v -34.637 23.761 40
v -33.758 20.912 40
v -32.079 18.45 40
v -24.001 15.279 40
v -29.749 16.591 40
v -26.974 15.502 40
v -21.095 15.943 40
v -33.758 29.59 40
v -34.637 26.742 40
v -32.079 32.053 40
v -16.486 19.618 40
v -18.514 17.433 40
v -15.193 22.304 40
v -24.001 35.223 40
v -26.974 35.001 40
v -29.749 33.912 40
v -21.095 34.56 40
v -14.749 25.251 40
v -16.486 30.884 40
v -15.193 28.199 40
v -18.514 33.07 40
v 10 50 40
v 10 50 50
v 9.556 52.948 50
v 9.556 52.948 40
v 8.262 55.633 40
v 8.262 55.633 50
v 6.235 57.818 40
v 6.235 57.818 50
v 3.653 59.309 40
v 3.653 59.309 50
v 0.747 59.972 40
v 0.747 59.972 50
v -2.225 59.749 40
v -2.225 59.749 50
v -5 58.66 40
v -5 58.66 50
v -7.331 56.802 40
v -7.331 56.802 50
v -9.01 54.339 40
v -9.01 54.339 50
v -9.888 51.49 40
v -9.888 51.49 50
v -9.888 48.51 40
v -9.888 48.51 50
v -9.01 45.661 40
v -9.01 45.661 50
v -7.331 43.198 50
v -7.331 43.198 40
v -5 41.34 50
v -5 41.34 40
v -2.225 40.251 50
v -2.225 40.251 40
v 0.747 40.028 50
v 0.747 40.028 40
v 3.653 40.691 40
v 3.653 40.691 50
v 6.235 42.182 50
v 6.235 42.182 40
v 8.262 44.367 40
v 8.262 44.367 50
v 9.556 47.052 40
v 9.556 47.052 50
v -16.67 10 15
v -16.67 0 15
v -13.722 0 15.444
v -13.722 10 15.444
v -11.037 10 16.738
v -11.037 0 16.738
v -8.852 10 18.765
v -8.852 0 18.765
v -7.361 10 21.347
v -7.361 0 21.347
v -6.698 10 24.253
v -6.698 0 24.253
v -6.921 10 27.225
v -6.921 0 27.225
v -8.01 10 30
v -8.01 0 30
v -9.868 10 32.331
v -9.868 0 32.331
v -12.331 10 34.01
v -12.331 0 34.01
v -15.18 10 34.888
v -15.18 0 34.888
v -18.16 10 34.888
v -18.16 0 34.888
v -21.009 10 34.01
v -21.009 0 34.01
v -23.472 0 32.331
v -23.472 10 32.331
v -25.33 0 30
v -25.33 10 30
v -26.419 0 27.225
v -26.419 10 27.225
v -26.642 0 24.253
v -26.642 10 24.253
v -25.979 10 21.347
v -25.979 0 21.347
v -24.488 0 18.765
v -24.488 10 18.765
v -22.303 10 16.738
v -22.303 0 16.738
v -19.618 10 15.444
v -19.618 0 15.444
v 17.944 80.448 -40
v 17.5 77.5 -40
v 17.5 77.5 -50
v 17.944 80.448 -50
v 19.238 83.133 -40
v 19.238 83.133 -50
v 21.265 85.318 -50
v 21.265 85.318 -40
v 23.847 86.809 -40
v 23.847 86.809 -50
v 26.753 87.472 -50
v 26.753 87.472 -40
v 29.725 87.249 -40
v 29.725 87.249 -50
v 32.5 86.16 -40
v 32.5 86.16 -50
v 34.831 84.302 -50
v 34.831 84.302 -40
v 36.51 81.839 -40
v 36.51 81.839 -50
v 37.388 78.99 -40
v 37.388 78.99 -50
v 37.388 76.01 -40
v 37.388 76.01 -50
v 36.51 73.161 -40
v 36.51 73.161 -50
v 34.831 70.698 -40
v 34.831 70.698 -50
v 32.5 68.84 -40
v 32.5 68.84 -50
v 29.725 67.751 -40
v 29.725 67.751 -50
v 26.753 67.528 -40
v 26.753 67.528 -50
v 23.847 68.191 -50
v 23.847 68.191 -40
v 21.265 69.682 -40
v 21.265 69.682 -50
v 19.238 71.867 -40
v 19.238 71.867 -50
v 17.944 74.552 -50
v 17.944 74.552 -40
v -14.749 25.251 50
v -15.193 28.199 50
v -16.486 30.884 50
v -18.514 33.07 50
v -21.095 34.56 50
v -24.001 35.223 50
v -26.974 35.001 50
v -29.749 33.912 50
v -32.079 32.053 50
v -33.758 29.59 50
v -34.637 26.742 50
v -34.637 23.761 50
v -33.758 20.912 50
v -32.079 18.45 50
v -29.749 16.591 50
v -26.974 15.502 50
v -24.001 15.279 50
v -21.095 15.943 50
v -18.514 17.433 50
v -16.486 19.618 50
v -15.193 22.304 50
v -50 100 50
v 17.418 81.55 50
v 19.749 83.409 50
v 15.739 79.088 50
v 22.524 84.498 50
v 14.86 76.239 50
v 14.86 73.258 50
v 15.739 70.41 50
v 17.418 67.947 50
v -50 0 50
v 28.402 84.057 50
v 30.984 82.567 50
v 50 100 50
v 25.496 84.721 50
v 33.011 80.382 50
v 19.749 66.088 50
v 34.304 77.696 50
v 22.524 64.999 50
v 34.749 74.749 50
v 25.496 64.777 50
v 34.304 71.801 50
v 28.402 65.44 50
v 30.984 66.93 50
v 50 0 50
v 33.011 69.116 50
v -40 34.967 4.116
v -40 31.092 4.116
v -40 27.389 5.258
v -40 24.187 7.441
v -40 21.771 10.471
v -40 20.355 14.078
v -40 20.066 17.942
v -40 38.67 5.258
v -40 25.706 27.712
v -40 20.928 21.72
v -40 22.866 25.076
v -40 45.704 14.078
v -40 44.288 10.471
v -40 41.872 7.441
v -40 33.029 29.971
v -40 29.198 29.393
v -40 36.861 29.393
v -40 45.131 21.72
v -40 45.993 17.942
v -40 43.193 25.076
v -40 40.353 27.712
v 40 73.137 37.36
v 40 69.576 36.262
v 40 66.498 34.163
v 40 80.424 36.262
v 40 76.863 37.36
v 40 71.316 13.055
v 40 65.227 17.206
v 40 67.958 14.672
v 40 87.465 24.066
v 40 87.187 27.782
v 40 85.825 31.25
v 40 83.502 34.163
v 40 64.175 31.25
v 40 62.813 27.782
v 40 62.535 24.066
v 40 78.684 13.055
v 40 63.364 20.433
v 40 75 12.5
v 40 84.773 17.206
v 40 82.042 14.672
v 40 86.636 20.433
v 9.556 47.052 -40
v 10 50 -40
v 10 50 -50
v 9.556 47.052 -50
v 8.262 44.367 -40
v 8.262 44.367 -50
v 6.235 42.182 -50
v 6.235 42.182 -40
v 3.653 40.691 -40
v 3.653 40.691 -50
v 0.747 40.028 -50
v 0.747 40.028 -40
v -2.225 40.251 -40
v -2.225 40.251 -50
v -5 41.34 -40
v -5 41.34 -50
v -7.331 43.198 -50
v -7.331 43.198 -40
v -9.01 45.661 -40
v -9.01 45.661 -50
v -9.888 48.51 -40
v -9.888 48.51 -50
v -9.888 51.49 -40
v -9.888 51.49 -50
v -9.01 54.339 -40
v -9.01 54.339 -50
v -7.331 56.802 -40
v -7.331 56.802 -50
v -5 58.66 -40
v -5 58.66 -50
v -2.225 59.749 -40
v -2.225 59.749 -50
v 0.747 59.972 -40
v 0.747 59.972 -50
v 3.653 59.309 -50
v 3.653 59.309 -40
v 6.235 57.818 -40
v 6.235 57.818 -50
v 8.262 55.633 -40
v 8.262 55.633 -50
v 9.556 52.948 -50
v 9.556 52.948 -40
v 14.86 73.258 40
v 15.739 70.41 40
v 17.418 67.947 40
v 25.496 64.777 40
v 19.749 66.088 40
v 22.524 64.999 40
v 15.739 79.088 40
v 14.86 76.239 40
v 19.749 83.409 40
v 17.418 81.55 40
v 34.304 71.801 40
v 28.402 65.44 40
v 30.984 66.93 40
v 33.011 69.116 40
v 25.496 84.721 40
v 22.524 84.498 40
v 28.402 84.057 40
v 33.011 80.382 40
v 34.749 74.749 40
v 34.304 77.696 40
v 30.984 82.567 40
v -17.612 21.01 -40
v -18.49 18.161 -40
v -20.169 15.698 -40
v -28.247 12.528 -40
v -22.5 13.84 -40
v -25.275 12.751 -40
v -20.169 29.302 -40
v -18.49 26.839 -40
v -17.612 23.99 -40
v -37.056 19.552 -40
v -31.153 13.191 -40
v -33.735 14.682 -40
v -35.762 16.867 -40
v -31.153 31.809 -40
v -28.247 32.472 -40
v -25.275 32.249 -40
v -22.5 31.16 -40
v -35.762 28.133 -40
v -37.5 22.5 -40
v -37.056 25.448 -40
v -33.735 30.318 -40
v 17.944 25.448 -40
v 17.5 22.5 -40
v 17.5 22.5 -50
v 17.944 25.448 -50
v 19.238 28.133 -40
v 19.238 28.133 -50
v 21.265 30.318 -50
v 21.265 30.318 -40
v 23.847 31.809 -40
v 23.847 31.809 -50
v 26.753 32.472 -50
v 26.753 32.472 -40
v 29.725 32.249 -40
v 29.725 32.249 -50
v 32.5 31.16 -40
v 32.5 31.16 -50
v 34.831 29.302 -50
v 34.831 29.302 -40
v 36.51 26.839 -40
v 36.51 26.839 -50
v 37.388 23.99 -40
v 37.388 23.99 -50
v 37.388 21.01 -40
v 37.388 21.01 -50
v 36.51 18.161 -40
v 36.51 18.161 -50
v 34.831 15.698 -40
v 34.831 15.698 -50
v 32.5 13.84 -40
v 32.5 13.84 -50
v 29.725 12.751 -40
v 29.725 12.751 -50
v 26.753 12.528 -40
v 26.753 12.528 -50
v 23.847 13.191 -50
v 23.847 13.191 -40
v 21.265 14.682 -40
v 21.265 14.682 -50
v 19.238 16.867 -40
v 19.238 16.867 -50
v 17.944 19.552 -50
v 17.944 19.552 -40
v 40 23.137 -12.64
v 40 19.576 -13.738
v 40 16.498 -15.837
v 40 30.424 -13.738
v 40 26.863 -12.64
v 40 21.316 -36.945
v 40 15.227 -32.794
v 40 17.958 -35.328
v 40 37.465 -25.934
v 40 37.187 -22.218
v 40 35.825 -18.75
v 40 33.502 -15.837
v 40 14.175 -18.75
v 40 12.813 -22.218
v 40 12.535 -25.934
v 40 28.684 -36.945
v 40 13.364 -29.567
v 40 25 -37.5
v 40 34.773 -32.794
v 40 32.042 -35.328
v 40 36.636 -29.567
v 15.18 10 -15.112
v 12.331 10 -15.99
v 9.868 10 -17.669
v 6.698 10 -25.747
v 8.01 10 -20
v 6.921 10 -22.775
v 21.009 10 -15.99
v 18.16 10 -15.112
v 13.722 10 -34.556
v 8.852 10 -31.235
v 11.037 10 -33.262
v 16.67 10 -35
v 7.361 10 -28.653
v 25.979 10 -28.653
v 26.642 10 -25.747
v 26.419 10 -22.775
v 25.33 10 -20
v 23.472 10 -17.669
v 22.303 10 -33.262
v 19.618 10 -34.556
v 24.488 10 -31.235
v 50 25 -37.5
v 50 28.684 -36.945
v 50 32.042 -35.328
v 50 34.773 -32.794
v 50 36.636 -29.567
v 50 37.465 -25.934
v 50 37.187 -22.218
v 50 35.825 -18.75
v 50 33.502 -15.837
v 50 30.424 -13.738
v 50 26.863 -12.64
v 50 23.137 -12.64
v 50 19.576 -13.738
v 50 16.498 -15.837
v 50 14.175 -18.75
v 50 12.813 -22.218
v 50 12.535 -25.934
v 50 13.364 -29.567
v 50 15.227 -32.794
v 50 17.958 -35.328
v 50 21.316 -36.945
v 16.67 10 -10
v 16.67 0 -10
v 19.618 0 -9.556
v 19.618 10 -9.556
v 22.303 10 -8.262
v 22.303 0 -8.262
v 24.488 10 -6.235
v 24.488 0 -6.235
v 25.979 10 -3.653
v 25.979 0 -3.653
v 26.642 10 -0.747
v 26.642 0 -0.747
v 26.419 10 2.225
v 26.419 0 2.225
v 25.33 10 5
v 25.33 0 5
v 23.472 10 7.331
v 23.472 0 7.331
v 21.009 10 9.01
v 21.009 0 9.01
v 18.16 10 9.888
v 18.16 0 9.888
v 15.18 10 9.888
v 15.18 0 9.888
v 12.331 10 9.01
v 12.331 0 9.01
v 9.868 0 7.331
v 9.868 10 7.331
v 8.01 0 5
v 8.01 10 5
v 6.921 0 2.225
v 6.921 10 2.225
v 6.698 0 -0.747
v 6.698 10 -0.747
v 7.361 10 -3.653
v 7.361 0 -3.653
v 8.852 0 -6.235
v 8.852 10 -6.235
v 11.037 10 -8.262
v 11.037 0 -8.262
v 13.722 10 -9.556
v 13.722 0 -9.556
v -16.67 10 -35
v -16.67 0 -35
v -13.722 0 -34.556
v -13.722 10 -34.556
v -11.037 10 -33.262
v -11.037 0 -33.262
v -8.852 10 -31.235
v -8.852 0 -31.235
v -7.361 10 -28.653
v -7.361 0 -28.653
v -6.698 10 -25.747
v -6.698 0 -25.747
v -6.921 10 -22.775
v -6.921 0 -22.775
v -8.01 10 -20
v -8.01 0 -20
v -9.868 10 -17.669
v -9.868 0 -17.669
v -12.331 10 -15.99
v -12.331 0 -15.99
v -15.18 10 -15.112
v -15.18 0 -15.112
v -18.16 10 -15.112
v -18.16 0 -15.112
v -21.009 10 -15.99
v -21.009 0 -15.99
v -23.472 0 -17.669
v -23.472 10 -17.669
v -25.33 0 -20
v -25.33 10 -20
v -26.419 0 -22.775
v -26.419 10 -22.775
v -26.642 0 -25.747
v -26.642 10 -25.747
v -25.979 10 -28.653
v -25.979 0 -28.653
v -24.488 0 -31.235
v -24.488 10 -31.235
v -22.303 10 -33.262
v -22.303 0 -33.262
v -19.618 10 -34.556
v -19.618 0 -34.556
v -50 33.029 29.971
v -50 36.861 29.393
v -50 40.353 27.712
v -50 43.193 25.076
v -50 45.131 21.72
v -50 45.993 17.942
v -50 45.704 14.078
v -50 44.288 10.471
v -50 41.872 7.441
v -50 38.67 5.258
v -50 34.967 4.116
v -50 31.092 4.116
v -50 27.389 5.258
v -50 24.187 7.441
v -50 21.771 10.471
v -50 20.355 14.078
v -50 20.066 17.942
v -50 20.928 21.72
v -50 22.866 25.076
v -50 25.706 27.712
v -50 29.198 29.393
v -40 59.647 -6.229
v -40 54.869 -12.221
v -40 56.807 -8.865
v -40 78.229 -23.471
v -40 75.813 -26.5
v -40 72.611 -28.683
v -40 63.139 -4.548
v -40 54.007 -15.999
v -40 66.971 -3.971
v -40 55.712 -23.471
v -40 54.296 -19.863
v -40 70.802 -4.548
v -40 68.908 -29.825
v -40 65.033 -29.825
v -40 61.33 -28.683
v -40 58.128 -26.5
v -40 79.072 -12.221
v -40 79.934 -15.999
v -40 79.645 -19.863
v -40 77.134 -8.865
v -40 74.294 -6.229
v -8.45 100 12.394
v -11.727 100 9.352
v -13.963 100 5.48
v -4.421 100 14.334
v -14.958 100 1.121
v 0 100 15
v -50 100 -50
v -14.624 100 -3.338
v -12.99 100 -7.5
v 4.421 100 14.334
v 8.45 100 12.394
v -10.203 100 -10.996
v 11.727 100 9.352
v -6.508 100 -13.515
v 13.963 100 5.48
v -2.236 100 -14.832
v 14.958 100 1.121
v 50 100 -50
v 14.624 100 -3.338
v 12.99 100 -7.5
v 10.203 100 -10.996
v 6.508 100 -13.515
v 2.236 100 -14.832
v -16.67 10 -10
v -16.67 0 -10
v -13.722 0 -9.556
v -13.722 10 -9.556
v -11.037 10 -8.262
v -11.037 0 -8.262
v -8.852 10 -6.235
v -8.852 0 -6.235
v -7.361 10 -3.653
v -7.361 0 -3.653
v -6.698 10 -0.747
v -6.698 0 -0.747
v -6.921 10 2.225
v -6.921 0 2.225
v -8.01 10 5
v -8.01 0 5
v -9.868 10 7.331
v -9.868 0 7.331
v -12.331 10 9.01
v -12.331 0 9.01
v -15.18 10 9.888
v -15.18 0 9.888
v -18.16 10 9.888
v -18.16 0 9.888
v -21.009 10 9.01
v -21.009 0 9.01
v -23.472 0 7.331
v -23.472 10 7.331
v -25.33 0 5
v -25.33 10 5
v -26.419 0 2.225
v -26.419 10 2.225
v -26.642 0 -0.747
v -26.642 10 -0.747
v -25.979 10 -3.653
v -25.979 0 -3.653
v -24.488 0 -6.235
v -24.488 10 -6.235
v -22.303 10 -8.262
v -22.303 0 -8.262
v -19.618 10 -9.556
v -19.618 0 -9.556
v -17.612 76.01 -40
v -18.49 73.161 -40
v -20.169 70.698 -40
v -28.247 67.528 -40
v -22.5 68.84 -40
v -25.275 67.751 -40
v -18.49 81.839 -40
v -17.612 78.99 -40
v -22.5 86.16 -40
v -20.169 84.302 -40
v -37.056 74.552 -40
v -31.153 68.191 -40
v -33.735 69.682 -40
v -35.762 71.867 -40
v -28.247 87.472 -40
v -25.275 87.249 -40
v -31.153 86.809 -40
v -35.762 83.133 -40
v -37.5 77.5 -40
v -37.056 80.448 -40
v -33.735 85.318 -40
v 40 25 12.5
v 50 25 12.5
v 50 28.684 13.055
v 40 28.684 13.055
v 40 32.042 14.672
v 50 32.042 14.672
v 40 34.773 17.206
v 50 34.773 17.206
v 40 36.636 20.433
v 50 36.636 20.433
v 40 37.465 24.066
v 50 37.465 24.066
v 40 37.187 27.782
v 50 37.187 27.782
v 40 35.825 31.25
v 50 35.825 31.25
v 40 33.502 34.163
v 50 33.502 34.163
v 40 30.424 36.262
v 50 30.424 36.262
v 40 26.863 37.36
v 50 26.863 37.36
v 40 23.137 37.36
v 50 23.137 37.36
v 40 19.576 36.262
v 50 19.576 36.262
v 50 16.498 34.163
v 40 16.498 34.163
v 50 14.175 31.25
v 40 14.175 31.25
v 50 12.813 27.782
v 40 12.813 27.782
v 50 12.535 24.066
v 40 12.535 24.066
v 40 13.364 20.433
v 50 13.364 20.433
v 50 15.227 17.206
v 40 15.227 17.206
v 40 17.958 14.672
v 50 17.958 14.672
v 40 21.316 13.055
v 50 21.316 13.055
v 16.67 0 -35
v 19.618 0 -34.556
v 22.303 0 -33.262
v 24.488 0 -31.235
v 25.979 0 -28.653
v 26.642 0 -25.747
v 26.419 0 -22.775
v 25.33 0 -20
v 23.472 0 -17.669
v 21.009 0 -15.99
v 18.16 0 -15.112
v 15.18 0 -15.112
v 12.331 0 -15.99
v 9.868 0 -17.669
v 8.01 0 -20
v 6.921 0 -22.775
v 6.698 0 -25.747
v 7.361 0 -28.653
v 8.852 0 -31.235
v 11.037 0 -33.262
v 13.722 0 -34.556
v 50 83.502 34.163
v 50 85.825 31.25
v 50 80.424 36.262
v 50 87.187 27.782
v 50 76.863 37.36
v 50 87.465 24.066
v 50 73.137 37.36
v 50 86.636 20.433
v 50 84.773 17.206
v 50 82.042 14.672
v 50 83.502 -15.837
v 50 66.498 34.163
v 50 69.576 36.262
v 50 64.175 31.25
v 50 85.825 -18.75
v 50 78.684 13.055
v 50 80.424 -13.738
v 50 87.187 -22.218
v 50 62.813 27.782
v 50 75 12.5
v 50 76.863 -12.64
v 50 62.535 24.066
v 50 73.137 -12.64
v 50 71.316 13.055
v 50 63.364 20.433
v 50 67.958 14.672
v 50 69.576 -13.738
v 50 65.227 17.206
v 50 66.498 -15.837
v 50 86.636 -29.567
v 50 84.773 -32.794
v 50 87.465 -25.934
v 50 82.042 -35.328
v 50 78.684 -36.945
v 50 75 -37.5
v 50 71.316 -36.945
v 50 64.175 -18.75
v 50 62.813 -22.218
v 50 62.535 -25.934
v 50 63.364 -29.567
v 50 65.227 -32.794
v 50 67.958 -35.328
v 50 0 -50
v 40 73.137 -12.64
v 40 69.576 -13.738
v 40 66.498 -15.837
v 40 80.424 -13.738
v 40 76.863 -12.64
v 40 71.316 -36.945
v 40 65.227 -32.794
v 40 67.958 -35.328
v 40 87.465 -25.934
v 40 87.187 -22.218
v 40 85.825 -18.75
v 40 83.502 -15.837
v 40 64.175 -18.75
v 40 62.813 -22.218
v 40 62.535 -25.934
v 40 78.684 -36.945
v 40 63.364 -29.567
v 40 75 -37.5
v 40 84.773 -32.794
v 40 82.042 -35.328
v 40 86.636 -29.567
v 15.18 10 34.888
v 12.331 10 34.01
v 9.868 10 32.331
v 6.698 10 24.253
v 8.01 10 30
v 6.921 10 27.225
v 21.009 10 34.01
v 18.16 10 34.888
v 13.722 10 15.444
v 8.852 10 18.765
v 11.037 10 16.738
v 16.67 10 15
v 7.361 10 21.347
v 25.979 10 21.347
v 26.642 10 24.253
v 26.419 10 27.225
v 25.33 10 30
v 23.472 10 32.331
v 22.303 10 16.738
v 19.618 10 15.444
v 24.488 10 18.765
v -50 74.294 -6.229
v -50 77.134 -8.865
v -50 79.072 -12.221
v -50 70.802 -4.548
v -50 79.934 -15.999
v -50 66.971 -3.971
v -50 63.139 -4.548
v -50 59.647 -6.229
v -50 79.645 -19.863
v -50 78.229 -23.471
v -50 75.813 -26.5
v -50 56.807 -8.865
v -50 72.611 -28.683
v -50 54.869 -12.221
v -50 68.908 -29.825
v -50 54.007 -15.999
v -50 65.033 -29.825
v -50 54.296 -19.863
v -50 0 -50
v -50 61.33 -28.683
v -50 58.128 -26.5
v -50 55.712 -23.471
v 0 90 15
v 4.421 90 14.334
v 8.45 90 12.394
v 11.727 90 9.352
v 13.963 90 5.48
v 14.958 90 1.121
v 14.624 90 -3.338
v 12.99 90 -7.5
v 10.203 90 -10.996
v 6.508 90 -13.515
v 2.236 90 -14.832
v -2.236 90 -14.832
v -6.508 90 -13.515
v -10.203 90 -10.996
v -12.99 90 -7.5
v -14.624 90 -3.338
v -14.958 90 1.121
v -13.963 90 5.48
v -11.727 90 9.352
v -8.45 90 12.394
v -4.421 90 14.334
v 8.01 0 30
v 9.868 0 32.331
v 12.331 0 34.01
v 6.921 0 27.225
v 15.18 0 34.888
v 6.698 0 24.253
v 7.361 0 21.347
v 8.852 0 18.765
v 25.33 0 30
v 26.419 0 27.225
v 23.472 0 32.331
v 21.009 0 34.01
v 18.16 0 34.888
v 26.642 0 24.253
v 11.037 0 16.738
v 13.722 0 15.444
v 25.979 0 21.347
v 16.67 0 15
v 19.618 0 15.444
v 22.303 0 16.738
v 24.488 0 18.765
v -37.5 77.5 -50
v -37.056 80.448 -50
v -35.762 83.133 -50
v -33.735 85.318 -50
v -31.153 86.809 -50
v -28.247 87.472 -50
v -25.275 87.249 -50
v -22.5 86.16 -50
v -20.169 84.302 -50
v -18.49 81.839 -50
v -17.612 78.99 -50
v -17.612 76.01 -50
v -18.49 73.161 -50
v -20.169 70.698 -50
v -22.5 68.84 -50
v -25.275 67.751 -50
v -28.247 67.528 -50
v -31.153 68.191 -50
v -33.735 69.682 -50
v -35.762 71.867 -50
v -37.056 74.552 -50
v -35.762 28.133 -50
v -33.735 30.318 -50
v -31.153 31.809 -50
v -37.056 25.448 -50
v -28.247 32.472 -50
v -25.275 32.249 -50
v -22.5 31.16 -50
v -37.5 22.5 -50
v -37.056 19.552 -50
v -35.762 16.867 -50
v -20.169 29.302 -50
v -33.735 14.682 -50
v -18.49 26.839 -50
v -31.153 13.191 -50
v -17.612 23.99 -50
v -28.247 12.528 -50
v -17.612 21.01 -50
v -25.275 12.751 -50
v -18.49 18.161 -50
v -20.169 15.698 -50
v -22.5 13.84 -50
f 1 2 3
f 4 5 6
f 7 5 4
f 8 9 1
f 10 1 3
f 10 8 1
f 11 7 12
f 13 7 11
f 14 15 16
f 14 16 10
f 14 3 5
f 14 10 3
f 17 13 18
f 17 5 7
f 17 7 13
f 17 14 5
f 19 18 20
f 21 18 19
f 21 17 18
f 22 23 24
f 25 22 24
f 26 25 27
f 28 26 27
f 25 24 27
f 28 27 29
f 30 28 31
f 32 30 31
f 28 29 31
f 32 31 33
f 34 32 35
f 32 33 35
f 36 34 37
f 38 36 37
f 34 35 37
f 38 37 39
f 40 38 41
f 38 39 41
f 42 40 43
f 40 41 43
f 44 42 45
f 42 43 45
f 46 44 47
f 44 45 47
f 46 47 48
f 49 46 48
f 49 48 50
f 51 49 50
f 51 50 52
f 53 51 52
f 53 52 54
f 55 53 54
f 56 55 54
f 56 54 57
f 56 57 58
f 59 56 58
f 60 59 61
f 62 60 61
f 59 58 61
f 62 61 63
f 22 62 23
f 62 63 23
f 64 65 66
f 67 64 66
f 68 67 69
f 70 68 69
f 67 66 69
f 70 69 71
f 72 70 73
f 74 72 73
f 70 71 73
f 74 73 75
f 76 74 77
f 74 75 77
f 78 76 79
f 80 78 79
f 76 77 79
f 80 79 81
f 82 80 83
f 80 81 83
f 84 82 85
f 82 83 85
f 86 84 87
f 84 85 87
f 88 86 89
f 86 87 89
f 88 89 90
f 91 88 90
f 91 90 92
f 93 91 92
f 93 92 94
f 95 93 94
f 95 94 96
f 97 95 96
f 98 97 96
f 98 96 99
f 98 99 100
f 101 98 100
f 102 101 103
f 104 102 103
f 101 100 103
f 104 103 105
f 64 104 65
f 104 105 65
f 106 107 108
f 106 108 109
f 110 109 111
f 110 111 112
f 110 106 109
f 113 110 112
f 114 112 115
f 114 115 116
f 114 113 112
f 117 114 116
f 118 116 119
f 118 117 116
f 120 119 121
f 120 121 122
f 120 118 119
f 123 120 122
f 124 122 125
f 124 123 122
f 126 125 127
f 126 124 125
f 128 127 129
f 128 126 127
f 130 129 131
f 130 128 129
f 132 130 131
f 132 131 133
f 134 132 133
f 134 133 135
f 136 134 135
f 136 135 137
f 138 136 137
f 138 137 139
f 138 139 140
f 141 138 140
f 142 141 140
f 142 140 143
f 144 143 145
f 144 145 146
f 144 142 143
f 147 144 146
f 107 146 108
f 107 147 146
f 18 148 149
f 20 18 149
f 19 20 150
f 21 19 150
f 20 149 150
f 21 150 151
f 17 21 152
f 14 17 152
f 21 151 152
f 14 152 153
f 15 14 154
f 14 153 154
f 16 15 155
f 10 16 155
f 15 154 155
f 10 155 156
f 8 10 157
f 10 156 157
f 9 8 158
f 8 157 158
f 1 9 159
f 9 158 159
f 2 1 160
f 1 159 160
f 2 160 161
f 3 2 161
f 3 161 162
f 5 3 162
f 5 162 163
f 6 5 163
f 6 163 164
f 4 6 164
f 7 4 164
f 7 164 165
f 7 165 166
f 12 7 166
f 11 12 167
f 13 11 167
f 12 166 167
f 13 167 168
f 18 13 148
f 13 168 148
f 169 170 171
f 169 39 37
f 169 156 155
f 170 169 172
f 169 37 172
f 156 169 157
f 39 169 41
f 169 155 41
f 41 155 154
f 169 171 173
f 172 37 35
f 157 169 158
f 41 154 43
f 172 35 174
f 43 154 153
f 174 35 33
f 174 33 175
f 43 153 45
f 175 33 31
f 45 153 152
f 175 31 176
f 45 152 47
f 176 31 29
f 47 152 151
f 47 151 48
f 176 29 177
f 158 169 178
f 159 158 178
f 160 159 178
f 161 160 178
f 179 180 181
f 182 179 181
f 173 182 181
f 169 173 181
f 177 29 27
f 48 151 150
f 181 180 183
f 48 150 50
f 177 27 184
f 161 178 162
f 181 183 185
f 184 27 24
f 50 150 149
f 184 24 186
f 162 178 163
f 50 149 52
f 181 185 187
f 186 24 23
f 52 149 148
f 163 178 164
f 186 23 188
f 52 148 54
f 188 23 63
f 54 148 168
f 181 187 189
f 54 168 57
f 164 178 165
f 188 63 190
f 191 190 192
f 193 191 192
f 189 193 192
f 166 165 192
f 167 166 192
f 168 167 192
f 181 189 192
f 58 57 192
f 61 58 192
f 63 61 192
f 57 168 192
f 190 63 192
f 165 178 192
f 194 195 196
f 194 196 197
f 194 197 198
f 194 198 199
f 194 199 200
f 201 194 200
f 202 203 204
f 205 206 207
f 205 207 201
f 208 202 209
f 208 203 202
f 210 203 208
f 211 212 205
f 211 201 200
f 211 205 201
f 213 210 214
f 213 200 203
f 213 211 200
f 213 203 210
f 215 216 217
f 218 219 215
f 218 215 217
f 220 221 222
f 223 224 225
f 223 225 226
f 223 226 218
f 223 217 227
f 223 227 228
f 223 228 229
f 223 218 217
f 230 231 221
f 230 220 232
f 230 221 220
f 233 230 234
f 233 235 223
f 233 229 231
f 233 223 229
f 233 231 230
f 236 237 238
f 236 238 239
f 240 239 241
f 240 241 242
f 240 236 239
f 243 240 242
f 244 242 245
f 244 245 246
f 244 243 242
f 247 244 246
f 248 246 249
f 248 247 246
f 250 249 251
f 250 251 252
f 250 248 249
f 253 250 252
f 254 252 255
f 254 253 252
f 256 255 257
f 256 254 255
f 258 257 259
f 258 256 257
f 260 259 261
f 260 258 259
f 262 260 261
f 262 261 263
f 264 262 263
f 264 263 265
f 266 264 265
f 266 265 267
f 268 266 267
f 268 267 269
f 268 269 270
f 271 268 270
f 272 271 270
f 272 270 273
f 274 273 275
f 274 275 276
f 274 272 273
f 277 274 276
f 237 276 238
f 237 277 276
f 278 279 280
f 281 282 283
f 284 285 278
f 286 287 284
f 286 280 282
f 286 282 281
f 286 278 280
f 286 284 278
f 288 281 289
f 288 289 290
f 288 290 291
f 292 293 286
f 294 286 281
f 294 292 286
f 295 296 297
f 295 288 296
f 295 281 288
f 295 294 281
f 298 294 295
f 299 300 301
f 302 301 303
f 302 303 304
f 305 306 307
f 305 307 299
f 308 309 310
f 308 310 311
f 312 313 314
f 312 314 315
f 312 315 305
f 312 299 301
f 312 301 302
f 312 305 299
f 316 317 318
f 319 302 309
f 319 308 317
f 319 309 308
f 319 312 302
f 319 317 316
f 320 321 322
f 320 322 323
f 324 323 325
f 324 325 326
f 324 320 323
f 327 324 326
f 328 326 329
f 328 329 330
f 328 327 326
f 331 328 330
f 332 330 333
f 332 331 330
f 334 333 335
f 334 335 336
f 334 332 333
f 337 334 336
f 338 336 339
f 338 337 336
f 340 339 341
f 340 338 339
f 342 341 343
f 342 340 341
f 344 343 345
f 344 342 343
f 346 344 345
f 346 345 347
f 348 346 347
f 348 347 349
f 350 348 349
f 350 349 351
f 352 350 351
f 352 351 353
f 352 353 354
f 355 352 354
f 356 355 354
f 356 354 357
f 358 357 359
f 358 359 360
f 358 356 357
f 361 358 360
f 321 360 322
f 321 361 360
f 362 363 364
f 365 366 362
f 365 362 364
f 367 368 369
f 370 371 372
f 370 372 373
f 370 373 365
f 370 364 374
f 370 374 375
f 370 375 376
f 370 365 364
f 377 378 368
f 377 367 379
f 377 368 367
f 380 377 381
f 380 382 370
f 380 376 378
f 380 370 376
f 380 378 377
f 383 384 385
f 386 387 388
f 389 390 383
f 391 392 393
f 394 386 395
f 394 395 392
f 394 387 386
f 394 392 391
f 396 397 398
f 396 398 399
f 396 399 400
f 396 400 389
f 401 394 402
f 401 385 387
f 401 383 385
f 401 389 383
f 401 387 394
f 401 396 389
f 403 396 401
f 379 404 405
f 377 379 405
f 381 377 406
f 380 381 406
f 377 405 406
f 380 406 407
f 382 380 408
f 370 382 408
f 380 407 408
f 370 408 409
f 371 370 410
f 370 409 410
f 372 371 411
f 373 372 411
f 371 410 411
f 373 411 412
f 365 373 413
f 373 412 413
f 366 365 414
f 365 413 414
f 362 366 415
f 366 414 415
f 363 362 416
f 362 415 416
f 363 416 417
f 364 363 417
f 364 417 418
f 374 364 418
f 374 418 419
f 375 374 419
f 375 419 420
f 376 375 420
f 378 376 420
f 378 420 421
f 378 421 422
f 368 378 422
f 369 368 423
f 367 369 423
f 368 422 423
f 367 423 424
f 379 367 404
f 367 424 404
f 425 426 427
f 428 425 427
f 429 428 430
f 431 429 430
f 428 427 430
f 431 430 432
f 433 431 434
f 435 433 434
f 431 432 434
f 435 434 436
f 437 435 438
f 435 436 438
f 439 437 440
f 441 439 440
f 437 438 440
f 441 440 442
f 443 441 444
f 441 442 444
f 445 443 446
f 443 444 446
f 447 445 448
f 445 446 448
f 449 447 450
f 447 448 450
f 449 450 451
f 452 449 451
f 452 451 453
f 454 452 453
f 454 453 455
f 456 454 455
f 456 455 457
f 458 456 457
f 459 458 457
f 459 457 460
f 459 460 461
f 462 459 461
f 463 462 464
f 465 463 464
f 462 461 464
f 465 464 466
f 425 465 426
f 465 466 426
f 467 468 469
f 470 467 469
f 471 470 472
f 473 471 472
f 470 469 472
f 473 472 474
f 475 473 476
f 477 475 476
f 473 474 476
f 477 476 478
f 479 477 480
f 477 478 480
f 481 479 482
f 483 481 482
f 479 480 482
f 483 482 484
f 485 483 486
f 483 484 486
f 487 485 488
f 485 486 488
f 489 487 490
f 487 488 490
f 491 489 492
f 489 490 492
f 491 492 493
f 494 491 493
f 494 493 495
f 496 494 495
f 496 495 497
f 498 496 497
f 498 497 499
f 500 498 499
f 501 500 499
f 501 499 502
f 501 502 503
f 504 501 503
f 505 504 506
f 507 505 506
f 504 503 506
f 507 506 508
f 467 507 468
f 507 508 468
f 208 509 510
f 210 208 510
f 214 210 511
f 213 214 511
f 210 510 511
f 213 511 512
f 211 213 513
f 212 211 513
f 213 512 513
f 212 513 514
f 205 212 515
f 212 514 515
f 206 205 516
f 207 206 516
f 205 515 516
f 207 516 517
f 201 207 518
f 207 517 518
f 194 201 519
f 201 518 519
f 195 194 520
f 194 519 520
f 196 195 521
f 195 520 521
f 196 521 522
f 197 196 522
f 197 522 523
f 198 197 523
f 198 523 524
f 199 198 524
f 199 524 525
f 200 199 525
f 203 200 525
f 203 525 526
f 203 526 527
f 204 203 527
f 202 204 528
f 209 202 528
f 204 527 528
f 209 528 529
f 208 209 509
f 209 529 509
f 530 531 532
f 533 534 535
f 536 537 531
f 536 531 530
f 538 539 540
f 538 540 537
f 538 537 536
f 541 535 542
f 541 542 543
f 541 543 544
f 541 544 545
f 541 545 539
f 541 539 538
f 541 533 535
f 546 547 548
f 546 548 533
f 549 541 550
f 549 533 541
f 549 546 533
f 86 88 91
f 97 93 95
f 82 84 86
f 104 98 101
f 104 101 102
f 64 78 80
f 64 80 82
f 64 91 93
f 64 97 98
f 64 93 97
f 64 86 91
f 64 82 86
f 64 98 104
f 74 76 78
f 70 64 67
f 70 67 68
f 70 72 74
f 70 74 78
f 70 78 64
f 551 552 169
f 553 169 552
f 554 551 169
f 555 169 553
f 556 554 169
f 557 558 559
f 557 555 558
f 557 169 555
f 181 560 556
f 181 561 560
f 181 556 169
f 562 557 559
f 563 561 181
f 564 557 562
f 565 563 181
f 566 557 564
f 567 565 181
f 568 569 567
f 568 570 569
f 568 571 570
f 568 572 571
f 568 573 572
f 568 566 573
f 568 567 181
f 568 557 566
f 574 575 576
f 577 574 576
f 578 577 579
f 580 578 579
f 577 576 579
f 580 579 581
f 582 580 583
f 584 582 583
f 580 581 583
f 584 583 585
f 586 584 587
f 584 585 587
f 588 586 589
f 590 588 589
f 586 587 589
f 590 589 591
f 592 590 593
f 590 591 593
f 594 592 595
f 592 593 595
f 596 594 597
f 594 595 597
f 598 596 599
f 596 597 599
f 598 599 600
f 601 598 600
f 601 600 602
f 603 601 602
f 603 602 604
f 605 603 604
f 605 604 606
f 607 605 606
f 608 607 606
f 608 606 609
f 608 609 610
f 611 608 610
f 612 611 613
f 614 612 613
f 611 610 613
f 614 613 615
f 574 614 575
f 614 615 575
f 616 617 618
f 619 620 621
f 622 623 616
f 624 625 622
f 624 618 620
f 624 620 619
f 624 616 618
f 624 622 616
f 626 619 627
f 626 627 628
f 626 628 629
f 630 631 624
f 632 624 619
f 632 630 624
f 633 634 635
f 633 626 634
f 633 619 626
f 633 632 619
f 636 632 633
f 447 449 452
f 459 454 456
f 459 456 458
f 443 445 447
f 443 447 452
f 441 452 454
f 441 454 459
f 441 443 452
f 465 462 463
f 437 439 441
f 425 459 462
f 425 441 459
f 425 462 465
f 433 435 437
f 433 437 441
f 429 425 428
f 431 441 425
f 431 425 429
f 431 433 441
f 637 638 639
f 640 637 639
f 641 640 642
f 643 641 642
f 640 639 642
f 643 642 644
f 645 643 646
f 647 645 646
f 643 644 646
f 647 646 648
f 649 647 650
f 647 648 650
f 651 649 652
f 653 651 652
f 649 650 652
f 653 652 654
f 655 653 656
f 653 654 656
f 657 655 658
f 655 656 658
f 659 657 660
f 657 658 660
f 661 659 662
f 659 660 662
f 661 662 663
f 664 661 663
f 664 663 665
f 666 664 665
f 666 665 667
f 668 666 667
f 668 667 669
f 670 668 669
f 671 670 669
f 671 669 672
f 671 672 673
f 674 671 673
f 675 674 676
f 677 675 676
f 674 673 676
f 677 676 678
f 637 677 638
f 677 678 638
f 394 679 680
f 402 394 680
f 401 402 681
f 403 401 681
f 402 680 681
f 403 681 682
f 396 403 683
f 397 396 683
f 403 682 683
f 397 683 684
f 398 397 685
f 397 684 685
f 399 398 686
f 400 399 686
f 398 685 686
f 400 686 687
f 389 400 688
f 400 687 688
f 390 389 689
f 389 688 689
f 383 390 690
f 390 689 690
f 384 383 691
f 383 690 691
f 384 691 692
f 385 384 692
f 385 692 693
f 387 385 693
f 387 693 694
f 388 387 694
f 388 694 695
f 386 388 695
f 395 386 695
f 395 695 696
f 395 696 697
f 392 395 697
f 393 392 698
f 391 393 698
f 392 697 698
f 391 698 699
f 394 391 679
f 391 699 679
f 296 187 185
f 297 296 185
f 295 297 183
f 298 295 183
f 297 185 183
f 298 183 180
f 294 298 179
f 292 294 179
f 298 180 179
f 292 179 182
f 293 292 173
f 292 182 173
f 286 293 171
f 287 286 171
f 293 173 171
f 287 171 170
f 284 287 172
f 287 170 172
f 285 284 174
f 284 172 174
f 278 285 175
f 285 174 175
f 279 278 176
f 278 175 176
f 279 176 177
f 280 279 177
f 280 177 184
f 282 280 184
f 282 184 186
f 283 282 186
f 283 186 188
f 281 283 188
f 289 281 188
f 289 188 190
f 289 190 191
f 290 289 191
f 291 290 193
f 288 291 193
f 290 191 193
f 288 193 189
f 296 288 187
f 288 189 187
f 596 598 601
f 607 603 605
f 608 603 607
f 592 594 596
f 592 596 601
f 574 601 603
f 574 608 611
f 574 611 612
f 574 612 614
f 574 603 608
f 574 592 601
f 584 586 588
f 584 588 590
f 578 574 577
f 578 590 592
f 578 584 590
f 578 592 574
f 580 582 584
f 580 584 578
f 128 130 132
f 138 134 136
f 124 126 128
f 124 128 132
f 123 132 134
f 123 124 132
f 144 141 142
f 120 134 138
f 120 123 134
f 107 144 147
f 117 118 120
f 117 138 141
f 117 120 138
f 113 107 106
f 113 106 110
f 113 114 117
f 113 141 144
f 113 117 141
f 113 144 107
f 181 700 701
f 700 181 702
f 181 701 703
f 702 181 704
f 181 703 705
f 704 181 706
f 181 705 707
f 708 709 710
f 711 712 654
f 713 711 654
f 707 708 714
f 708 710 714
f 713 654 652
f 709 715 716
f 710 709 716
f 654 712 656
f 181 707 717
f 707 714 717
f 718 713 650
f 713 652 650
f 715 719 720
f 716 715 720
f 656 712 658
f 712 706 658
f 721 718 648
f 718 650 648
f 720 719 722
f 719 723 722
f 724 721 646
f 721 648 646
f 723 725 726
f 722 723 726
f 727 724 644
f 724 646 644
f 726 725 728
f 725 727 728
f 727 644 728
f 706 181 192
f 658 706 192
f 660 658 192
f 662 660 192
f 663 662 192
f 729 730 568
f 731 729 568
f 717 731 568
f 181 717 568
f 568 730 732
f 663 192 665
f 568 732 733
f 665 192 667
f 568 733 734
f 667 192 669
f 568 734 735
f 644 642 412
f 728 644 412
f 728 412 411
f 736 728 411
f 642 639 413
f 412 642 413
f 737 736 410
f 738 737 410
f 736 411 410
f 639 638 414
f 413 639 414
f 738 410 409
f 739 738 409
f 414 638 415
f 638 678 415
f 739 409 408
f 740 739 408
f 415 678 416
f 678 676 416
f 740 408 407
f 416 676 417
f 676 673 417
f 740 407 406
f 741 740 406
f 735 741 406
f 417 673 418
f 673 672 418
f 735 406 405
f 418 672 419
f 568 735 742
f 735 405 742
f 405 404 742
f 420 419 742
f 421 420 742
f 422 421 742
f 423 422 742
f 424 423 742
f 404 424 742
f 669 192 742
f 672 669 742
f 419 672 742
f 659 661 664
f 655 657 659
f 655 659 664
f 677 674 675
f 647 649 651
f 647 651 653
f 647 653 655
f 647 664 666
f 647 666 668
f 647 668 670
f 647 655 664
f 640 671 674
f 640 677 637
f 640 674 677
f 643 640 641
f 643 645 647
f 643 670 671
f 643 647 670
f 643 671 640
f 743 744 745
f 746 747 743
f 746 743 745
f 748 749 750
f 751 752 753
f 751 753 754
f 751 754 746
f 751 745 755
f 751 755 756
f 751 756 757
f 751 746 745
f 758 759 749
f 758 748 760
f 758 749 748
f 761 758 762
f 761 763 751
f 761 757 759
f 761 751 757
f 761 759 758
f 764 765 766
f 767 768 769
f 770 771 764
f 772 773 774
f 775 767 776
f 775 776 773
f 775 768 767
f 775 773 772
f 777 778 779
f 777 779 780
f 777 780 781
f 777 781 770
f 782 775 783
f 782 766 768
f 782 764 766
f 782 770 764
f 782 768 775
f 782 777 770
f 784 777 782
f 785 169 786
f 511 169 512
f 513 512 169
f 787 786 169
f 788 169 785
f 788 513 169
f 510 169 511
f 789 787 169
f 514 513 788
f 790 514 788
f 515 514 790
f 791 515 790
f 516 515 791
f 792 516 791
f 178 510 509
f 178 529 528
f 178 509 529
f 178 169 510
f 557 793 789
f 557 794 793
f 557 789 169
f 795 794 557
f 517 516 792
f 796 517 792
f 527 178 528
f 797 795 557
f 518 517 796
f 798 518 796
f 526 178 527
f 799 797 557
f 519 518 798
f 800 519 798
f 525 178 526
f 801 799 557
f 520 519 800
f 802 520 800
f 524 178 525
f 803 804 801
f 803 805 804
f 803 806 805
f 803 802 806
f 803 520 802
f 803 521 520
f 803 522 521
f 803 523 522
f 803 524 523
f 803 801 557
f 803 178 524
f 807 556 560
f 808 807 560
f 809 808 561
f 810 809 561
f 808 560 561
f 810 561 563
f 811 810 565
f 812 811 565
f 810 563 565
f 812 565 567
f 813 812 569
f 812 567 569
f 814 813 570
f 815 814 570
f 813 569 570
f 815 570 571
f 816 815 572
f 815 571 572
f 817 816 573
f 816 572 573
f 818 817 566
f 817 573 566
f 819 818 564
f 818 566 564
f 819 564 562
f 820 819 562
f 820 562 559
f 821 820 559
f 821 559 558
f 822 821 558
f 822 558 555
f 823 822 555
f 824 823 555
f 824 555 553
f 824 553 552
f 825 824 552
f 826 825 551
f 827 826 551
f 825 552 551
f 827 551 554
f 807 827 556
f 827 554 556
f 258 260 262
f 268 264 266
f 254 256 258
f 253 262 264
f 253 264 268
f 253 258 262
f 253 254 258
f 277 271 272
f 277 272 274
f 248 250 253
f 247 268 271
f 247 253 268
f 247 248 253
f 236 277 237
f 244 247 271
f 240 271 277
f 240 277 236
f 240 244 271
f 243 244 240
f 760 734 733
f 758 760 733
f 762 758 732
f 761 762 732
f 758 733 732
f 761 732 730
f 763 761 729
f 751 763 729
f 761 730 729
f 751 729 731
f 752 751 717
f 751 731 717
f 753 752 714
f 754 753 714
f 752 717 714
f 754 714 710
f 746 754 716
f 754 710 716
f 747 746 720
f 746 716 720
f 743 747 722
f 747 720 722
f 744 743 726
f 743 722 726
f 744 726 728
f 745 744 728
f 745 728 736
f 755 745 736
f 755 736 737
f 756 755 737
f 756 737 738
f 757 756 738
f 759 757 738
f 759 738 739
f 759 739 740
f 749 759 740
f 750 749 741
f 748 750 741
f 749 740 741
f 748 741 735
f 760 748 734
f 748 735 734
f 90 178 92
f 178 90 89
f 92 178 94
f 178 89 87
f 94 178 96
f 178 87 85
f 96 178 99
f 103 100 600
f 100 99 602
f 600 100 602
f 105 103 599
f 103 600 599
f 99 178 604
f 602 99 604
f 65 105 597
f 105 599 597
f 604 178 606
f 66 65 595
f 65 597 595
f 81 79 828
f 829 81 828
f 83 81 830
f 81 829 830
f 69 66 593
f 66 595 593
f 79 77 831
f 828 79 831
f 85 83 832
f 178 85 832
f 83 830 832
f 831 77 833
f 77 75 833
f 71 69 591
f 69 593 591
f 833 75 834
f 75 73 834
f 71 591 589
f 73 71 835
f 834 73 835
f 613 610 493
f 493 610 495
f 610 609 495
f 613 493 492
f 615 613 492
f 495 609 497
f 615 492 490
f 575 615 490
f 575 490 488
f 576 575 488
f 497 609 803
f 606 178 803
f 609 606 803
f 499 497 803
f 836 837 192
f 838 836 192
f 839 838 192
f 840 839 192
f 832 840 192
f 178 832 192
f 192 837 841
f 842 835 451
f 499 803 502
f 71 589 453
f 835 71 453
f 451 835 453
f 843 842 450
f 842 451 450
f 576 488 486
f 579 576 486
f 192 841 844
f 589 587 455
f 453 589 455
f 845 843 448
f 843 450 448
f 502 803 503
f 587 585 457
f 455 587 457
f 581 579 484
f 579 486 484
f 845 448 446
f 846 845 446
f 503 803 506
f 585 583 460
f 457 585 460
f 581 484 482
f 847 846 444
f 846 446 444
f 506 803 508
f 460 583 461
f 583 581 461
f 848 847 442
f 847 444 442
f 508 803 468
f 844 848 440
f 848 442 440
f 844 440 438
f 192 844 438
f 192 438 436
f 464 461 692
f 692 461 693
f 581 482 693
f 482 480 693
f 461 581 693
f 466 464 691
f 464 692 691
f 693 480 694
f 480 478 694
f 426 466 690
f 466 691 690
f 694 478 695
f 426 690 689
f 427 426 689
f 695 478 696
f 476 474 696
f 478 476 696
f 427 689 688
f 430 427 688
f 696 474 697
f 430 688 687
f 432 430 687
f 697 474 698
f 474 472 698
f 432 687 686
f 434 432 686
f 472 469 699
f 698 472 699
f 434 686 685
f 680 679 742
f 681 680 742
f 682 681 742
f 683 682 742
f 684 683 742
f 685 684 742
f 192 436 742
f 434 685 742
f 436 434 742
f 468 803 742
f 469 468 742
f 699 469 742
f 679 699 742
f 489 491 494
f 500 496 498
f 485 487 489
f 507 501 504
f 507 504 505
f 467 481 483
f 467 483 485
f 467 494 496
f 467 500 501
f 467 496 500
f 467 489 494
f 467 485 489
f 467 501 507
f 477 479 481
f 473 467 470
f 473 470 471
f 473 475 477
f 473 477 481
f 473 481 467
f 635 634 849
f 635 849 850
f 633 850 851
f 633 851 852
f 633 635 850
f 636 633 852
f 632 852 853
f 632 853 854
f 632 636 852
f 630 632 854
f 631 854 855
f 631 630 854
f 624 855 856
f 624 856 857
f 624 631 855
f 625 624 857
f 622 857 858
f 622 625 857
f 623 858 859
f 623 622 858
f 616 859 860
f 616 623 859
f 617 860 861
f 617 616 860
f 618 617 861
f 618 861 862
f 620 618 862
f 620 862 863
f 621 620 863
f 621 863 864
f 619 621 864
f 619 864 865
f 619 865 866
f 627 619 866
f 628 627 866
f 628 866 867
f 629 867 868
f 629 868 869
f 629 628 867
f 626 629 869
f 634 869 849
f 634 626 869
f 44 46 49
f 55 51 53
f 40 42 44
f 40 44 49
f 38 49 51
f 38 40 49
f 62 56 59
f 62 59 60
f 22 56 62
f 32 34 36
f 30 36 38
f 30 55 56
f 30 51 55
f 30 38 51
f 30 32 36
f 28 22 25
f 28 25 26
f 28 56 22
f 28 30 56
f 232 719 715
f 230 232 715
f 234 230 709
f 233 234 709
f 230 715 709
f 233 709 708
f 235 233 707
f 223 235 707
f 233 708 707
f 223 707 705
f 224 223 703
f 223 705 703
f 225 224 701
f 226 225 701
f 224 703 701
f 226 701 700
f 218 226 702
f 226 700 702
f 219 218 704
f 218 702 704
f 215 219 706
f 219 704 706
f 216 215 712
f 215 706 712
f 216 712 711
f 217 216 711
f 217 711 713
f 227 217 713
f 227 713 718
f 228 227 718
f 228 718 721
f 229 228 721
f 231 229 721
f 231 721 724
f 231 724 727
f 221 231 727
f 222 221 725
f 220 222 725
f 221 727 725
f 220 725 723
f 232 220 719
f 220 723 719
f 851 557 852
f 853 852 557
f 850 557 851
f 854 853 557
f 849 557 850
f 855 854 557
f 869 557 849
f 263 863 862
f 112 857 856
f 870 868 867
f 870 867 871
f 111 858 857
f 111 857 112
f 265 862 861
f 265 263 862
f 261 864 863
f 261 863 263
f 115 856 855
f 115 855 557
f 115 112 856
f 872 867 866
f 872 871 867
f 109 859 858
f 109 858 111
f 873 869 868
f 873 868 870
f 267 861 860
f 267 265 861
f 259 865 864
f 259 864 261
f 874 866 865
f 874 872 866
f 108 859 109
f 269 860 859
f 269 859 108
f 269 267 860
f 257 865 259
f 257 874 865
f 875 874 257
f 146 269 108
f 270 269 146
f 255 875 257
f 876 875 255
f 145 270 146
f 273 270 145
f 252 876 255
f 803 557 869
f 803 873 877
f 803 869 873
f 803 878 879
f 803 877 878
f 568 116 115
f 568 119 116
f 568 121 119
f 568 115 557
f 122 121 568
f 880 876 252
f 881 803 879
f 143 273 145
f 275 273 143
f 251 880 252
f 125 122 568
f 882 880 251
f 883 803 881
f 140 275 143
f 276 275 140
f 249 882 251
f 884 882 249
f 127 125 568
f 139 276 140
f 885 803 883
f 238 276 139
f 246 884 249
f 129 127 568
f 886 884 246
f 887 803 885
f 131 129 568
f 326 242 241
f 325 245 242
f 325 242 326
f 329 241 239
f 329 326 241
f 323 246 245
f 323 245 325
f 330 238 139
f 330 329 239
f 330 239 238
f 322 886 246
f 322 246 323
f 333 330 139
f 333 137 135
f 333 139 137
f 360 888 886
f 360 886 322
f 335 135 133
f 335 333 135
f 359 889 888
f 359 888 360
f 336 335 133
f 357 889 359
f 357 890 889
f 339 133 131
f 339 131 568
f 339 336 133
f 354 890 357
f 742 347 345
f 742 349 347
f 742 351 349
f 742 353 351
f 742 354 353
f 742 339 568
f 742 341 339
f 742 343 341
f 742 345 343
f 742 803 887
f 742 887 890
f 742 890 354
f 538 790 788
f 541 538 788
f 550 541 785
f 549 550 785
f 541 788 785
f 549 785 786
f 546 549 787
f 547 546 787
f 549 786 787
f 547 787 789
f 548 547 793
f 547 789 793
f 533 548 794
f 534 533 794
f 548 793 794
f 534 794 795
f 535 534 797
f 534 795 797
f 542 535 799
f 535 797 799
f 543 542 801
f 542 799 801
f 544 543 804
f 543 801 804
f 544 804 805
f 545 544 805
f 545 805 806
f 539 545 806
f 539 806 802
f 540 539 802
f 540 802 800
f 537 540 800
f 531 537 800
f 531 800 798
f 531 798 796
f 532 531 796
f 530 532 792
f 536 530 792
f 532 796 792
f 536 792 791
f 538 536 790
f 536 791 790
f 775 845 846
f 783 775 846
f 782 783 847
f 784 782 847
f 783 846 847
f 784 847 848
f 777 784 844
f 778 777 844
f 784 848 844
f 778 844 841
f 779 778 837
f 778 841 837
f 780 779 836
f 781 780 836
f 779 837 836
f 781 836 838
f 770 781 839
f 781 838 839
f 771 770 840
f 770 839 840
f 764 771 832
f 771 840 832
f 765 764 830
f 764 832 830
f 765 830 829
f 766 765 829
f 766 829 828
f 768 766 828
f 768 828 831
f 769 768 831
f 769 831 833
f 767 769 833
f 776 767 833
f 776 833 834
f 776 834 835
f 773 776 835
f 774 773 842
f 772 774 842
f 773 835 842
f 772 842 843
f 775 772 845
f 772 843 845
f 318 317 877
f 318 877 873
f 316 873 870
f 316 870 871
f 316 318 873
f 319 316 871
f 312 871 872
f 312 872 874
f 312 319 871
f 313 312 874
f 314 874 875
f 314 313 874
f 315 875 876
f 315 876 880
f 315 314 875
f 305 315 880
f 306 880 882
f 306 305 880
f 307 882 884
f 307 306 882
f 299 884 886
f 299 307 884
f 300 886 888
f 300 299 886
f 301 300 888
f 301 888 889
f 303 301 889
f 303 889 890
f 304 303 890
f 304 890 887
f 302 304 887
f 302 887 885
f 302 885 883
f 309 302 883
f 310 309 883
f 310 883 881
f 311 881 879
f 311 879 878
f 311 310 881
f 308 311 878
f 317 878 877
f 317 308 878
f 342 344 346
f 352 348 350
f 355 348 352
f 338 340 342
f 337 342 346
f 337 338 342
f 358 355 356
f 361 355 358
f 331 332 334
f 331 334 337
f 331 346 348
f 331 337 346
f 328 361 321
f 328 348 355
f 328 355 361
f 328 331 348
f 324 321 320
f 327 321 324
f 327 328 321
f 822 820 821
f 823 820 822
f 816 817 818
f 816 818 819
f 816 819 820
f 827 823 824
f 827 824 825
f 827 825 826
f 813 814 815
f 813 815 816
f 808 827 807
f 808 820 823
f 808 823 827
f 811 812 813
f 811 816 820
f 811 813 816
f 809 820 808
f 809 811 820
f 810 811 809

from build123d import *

# Parameters (mm, degrees)
SKETCH1_W           = 100
SKETCH1_H           = 100
BOSS_EXTRUDE1_DEPTH = 100
SKETCH3_R           = 15
CUT_EXTRUDE1_DEPTH  = 10
SKETCH5_R           = 10
CUT_EXTRUDE2_DEPTH  = 10
SKETCH8_R           = 13
CUT_EXTRUDE3_DEPTH  = 10
SKETCH12_R          = 12.5
CUT_EXTRUDE4_DEPTH  = 10
CUT_EXTRUDE5_START  = -10
SKETCH13_R          = 10
CUT_EXTRUDE5_DEPTH  = 10
SKETCH14_R          = 10
CUT_EXTRUDE6_DEPTH  = 10


with BuildPart() as part:
    # Sketch1 → Boss-Extrude1 (new body)
    with BuildSketch(Plane(origin=(0, 0, 0), x_dir=(1, 0, 0), z_dir=(0, 1, 0))):
        Rectangle(SKETCH1_W, SKETCH1_H)
    extrude(amount=BOSS_EXTRUDE1_DEPTH)

    # Sketch3 → Cut-Extrude1 (cut)
    with BuildSketch(Plane(origin=(0, 100, 0), x_dir=(1, 0, 0), z_dir=(0, 1, 0))):
        with Locations(Location((0, 0, 0), (0, 0, 270))):
            Circle(SKETCH3_R)
    extrude(amount=-CUT_EXTRUDE1_DEPTH, mode=Mode.SUBTRACT)

    # Sketch5 → Cut-Extrude2 (cut)
    with BuildSketch(Plane.XY.offset(50)):
        with Locations((0, 50)):
            Circle(SKETCH5_R)
        with Locations((24.748737342, 74.748737342)):
            Circle(SKETCH5_R)
        with Locations((-24.748737342, 25.251262658)):
            Circle(SKETCH5_R)
    extrude(amount=-CUT_EXTRUDE2_DEPTH, mode=Mode.SUBTRACT)

    # Sketch8 → Cut-Extrude3 (cut)
    with BuildSketch(Plane.ZY.offset(50)):
        with Locations((-16.970562748, 66.970562748)):
            Circle(SKETCH8_R)
        with Locations((16.970562748, 33.029437252)):
            Circle(SKETCH8_R)
    extrude(amount=-CUT_EXTRUDE3_DEPTH, mode=Mode.SUBTRACT)

    # Sketch12 → Cut-Extrude4 (cut)
    with BuildSketch(Plane(origin=(50, 0, 0), x_dir=(0, 0, -1), z_dir=(1, 0, 0))):
        with Locations((-25, 75)):
            Circle(SKETCH12_R)
        with Locations((25, 75)):
            Circle(SKETCH12_R)
        with Locations((25, 25)):
            Circle(SKETCH12_R)
        with Locations((-25, 25)):
            Circle(SKETCH12_R)
    extrude(amount=-CUT_EXTRUDE4_DEPTH, mode=Mode.SUBTRACT)

    # Sketch13 → Cut-Extrude5 (cut)
    with BuildSketch(Plane(origin=(0, 0, -50), x_dir=(-1, 0, 0), z_dir=(0, 0, -1)).offset(CUT_EXTRUDE5_START)):
        with Locations(Location((0, 50, 0), (0, 0, 180))):
            Circle(SKETCH13_R)
        with Locations((-27.5, 77.5)):
            Circle(SKETCH13_R)
        with Locations((27.5, 77.5)):
            Circle(SKETCH13_R)
        with Locations((27.5, 22.5)):
            Circle(SKETCH13_R)
        with Locations((-27.5, 22.5)):
            Circle(SKETCH13_R)
    extrude(amount=CUT_EXTRUDE5_DEPTH, mode=Mode.SUBTRACT)

    # Sketch14 → Cut-Extrude6 (cut)
    with BuildSketch(Plane(origin=(0, 0, 0), x_dir=(-1, 0, 0), z_dir=(0, -1, 0))):
        with Locations(Location((-16.67, 0, 0), (0, 0, 90))):
            Circle(SKETCH14_R)
        with Locations(Location((16.67, 0, 0), (0, 0, 90))):
            Circle(SKETCH14_R)
        with Locations(Location((16.67, 25, 0), (0, 0, 90))):
            Circle(SKETCH14_R)
        with Locations(Location((-16.67, 25, 0), (0, 0, 90))):
            Circle(SKETCH14_R)
        with Locations(Location((-16.67, -25, 0), (0, 0, 90))):
            Circle(SKETCH14_R)
        with Locations(Location((16.67, -25, 0), (0, 0, 90))):
            Circle(SKETCH14_R)
    extrude(amount=-CUT_EXTRUDE6_DEPTH, mode=Mode.SUBTRACT)


solid = part.part
